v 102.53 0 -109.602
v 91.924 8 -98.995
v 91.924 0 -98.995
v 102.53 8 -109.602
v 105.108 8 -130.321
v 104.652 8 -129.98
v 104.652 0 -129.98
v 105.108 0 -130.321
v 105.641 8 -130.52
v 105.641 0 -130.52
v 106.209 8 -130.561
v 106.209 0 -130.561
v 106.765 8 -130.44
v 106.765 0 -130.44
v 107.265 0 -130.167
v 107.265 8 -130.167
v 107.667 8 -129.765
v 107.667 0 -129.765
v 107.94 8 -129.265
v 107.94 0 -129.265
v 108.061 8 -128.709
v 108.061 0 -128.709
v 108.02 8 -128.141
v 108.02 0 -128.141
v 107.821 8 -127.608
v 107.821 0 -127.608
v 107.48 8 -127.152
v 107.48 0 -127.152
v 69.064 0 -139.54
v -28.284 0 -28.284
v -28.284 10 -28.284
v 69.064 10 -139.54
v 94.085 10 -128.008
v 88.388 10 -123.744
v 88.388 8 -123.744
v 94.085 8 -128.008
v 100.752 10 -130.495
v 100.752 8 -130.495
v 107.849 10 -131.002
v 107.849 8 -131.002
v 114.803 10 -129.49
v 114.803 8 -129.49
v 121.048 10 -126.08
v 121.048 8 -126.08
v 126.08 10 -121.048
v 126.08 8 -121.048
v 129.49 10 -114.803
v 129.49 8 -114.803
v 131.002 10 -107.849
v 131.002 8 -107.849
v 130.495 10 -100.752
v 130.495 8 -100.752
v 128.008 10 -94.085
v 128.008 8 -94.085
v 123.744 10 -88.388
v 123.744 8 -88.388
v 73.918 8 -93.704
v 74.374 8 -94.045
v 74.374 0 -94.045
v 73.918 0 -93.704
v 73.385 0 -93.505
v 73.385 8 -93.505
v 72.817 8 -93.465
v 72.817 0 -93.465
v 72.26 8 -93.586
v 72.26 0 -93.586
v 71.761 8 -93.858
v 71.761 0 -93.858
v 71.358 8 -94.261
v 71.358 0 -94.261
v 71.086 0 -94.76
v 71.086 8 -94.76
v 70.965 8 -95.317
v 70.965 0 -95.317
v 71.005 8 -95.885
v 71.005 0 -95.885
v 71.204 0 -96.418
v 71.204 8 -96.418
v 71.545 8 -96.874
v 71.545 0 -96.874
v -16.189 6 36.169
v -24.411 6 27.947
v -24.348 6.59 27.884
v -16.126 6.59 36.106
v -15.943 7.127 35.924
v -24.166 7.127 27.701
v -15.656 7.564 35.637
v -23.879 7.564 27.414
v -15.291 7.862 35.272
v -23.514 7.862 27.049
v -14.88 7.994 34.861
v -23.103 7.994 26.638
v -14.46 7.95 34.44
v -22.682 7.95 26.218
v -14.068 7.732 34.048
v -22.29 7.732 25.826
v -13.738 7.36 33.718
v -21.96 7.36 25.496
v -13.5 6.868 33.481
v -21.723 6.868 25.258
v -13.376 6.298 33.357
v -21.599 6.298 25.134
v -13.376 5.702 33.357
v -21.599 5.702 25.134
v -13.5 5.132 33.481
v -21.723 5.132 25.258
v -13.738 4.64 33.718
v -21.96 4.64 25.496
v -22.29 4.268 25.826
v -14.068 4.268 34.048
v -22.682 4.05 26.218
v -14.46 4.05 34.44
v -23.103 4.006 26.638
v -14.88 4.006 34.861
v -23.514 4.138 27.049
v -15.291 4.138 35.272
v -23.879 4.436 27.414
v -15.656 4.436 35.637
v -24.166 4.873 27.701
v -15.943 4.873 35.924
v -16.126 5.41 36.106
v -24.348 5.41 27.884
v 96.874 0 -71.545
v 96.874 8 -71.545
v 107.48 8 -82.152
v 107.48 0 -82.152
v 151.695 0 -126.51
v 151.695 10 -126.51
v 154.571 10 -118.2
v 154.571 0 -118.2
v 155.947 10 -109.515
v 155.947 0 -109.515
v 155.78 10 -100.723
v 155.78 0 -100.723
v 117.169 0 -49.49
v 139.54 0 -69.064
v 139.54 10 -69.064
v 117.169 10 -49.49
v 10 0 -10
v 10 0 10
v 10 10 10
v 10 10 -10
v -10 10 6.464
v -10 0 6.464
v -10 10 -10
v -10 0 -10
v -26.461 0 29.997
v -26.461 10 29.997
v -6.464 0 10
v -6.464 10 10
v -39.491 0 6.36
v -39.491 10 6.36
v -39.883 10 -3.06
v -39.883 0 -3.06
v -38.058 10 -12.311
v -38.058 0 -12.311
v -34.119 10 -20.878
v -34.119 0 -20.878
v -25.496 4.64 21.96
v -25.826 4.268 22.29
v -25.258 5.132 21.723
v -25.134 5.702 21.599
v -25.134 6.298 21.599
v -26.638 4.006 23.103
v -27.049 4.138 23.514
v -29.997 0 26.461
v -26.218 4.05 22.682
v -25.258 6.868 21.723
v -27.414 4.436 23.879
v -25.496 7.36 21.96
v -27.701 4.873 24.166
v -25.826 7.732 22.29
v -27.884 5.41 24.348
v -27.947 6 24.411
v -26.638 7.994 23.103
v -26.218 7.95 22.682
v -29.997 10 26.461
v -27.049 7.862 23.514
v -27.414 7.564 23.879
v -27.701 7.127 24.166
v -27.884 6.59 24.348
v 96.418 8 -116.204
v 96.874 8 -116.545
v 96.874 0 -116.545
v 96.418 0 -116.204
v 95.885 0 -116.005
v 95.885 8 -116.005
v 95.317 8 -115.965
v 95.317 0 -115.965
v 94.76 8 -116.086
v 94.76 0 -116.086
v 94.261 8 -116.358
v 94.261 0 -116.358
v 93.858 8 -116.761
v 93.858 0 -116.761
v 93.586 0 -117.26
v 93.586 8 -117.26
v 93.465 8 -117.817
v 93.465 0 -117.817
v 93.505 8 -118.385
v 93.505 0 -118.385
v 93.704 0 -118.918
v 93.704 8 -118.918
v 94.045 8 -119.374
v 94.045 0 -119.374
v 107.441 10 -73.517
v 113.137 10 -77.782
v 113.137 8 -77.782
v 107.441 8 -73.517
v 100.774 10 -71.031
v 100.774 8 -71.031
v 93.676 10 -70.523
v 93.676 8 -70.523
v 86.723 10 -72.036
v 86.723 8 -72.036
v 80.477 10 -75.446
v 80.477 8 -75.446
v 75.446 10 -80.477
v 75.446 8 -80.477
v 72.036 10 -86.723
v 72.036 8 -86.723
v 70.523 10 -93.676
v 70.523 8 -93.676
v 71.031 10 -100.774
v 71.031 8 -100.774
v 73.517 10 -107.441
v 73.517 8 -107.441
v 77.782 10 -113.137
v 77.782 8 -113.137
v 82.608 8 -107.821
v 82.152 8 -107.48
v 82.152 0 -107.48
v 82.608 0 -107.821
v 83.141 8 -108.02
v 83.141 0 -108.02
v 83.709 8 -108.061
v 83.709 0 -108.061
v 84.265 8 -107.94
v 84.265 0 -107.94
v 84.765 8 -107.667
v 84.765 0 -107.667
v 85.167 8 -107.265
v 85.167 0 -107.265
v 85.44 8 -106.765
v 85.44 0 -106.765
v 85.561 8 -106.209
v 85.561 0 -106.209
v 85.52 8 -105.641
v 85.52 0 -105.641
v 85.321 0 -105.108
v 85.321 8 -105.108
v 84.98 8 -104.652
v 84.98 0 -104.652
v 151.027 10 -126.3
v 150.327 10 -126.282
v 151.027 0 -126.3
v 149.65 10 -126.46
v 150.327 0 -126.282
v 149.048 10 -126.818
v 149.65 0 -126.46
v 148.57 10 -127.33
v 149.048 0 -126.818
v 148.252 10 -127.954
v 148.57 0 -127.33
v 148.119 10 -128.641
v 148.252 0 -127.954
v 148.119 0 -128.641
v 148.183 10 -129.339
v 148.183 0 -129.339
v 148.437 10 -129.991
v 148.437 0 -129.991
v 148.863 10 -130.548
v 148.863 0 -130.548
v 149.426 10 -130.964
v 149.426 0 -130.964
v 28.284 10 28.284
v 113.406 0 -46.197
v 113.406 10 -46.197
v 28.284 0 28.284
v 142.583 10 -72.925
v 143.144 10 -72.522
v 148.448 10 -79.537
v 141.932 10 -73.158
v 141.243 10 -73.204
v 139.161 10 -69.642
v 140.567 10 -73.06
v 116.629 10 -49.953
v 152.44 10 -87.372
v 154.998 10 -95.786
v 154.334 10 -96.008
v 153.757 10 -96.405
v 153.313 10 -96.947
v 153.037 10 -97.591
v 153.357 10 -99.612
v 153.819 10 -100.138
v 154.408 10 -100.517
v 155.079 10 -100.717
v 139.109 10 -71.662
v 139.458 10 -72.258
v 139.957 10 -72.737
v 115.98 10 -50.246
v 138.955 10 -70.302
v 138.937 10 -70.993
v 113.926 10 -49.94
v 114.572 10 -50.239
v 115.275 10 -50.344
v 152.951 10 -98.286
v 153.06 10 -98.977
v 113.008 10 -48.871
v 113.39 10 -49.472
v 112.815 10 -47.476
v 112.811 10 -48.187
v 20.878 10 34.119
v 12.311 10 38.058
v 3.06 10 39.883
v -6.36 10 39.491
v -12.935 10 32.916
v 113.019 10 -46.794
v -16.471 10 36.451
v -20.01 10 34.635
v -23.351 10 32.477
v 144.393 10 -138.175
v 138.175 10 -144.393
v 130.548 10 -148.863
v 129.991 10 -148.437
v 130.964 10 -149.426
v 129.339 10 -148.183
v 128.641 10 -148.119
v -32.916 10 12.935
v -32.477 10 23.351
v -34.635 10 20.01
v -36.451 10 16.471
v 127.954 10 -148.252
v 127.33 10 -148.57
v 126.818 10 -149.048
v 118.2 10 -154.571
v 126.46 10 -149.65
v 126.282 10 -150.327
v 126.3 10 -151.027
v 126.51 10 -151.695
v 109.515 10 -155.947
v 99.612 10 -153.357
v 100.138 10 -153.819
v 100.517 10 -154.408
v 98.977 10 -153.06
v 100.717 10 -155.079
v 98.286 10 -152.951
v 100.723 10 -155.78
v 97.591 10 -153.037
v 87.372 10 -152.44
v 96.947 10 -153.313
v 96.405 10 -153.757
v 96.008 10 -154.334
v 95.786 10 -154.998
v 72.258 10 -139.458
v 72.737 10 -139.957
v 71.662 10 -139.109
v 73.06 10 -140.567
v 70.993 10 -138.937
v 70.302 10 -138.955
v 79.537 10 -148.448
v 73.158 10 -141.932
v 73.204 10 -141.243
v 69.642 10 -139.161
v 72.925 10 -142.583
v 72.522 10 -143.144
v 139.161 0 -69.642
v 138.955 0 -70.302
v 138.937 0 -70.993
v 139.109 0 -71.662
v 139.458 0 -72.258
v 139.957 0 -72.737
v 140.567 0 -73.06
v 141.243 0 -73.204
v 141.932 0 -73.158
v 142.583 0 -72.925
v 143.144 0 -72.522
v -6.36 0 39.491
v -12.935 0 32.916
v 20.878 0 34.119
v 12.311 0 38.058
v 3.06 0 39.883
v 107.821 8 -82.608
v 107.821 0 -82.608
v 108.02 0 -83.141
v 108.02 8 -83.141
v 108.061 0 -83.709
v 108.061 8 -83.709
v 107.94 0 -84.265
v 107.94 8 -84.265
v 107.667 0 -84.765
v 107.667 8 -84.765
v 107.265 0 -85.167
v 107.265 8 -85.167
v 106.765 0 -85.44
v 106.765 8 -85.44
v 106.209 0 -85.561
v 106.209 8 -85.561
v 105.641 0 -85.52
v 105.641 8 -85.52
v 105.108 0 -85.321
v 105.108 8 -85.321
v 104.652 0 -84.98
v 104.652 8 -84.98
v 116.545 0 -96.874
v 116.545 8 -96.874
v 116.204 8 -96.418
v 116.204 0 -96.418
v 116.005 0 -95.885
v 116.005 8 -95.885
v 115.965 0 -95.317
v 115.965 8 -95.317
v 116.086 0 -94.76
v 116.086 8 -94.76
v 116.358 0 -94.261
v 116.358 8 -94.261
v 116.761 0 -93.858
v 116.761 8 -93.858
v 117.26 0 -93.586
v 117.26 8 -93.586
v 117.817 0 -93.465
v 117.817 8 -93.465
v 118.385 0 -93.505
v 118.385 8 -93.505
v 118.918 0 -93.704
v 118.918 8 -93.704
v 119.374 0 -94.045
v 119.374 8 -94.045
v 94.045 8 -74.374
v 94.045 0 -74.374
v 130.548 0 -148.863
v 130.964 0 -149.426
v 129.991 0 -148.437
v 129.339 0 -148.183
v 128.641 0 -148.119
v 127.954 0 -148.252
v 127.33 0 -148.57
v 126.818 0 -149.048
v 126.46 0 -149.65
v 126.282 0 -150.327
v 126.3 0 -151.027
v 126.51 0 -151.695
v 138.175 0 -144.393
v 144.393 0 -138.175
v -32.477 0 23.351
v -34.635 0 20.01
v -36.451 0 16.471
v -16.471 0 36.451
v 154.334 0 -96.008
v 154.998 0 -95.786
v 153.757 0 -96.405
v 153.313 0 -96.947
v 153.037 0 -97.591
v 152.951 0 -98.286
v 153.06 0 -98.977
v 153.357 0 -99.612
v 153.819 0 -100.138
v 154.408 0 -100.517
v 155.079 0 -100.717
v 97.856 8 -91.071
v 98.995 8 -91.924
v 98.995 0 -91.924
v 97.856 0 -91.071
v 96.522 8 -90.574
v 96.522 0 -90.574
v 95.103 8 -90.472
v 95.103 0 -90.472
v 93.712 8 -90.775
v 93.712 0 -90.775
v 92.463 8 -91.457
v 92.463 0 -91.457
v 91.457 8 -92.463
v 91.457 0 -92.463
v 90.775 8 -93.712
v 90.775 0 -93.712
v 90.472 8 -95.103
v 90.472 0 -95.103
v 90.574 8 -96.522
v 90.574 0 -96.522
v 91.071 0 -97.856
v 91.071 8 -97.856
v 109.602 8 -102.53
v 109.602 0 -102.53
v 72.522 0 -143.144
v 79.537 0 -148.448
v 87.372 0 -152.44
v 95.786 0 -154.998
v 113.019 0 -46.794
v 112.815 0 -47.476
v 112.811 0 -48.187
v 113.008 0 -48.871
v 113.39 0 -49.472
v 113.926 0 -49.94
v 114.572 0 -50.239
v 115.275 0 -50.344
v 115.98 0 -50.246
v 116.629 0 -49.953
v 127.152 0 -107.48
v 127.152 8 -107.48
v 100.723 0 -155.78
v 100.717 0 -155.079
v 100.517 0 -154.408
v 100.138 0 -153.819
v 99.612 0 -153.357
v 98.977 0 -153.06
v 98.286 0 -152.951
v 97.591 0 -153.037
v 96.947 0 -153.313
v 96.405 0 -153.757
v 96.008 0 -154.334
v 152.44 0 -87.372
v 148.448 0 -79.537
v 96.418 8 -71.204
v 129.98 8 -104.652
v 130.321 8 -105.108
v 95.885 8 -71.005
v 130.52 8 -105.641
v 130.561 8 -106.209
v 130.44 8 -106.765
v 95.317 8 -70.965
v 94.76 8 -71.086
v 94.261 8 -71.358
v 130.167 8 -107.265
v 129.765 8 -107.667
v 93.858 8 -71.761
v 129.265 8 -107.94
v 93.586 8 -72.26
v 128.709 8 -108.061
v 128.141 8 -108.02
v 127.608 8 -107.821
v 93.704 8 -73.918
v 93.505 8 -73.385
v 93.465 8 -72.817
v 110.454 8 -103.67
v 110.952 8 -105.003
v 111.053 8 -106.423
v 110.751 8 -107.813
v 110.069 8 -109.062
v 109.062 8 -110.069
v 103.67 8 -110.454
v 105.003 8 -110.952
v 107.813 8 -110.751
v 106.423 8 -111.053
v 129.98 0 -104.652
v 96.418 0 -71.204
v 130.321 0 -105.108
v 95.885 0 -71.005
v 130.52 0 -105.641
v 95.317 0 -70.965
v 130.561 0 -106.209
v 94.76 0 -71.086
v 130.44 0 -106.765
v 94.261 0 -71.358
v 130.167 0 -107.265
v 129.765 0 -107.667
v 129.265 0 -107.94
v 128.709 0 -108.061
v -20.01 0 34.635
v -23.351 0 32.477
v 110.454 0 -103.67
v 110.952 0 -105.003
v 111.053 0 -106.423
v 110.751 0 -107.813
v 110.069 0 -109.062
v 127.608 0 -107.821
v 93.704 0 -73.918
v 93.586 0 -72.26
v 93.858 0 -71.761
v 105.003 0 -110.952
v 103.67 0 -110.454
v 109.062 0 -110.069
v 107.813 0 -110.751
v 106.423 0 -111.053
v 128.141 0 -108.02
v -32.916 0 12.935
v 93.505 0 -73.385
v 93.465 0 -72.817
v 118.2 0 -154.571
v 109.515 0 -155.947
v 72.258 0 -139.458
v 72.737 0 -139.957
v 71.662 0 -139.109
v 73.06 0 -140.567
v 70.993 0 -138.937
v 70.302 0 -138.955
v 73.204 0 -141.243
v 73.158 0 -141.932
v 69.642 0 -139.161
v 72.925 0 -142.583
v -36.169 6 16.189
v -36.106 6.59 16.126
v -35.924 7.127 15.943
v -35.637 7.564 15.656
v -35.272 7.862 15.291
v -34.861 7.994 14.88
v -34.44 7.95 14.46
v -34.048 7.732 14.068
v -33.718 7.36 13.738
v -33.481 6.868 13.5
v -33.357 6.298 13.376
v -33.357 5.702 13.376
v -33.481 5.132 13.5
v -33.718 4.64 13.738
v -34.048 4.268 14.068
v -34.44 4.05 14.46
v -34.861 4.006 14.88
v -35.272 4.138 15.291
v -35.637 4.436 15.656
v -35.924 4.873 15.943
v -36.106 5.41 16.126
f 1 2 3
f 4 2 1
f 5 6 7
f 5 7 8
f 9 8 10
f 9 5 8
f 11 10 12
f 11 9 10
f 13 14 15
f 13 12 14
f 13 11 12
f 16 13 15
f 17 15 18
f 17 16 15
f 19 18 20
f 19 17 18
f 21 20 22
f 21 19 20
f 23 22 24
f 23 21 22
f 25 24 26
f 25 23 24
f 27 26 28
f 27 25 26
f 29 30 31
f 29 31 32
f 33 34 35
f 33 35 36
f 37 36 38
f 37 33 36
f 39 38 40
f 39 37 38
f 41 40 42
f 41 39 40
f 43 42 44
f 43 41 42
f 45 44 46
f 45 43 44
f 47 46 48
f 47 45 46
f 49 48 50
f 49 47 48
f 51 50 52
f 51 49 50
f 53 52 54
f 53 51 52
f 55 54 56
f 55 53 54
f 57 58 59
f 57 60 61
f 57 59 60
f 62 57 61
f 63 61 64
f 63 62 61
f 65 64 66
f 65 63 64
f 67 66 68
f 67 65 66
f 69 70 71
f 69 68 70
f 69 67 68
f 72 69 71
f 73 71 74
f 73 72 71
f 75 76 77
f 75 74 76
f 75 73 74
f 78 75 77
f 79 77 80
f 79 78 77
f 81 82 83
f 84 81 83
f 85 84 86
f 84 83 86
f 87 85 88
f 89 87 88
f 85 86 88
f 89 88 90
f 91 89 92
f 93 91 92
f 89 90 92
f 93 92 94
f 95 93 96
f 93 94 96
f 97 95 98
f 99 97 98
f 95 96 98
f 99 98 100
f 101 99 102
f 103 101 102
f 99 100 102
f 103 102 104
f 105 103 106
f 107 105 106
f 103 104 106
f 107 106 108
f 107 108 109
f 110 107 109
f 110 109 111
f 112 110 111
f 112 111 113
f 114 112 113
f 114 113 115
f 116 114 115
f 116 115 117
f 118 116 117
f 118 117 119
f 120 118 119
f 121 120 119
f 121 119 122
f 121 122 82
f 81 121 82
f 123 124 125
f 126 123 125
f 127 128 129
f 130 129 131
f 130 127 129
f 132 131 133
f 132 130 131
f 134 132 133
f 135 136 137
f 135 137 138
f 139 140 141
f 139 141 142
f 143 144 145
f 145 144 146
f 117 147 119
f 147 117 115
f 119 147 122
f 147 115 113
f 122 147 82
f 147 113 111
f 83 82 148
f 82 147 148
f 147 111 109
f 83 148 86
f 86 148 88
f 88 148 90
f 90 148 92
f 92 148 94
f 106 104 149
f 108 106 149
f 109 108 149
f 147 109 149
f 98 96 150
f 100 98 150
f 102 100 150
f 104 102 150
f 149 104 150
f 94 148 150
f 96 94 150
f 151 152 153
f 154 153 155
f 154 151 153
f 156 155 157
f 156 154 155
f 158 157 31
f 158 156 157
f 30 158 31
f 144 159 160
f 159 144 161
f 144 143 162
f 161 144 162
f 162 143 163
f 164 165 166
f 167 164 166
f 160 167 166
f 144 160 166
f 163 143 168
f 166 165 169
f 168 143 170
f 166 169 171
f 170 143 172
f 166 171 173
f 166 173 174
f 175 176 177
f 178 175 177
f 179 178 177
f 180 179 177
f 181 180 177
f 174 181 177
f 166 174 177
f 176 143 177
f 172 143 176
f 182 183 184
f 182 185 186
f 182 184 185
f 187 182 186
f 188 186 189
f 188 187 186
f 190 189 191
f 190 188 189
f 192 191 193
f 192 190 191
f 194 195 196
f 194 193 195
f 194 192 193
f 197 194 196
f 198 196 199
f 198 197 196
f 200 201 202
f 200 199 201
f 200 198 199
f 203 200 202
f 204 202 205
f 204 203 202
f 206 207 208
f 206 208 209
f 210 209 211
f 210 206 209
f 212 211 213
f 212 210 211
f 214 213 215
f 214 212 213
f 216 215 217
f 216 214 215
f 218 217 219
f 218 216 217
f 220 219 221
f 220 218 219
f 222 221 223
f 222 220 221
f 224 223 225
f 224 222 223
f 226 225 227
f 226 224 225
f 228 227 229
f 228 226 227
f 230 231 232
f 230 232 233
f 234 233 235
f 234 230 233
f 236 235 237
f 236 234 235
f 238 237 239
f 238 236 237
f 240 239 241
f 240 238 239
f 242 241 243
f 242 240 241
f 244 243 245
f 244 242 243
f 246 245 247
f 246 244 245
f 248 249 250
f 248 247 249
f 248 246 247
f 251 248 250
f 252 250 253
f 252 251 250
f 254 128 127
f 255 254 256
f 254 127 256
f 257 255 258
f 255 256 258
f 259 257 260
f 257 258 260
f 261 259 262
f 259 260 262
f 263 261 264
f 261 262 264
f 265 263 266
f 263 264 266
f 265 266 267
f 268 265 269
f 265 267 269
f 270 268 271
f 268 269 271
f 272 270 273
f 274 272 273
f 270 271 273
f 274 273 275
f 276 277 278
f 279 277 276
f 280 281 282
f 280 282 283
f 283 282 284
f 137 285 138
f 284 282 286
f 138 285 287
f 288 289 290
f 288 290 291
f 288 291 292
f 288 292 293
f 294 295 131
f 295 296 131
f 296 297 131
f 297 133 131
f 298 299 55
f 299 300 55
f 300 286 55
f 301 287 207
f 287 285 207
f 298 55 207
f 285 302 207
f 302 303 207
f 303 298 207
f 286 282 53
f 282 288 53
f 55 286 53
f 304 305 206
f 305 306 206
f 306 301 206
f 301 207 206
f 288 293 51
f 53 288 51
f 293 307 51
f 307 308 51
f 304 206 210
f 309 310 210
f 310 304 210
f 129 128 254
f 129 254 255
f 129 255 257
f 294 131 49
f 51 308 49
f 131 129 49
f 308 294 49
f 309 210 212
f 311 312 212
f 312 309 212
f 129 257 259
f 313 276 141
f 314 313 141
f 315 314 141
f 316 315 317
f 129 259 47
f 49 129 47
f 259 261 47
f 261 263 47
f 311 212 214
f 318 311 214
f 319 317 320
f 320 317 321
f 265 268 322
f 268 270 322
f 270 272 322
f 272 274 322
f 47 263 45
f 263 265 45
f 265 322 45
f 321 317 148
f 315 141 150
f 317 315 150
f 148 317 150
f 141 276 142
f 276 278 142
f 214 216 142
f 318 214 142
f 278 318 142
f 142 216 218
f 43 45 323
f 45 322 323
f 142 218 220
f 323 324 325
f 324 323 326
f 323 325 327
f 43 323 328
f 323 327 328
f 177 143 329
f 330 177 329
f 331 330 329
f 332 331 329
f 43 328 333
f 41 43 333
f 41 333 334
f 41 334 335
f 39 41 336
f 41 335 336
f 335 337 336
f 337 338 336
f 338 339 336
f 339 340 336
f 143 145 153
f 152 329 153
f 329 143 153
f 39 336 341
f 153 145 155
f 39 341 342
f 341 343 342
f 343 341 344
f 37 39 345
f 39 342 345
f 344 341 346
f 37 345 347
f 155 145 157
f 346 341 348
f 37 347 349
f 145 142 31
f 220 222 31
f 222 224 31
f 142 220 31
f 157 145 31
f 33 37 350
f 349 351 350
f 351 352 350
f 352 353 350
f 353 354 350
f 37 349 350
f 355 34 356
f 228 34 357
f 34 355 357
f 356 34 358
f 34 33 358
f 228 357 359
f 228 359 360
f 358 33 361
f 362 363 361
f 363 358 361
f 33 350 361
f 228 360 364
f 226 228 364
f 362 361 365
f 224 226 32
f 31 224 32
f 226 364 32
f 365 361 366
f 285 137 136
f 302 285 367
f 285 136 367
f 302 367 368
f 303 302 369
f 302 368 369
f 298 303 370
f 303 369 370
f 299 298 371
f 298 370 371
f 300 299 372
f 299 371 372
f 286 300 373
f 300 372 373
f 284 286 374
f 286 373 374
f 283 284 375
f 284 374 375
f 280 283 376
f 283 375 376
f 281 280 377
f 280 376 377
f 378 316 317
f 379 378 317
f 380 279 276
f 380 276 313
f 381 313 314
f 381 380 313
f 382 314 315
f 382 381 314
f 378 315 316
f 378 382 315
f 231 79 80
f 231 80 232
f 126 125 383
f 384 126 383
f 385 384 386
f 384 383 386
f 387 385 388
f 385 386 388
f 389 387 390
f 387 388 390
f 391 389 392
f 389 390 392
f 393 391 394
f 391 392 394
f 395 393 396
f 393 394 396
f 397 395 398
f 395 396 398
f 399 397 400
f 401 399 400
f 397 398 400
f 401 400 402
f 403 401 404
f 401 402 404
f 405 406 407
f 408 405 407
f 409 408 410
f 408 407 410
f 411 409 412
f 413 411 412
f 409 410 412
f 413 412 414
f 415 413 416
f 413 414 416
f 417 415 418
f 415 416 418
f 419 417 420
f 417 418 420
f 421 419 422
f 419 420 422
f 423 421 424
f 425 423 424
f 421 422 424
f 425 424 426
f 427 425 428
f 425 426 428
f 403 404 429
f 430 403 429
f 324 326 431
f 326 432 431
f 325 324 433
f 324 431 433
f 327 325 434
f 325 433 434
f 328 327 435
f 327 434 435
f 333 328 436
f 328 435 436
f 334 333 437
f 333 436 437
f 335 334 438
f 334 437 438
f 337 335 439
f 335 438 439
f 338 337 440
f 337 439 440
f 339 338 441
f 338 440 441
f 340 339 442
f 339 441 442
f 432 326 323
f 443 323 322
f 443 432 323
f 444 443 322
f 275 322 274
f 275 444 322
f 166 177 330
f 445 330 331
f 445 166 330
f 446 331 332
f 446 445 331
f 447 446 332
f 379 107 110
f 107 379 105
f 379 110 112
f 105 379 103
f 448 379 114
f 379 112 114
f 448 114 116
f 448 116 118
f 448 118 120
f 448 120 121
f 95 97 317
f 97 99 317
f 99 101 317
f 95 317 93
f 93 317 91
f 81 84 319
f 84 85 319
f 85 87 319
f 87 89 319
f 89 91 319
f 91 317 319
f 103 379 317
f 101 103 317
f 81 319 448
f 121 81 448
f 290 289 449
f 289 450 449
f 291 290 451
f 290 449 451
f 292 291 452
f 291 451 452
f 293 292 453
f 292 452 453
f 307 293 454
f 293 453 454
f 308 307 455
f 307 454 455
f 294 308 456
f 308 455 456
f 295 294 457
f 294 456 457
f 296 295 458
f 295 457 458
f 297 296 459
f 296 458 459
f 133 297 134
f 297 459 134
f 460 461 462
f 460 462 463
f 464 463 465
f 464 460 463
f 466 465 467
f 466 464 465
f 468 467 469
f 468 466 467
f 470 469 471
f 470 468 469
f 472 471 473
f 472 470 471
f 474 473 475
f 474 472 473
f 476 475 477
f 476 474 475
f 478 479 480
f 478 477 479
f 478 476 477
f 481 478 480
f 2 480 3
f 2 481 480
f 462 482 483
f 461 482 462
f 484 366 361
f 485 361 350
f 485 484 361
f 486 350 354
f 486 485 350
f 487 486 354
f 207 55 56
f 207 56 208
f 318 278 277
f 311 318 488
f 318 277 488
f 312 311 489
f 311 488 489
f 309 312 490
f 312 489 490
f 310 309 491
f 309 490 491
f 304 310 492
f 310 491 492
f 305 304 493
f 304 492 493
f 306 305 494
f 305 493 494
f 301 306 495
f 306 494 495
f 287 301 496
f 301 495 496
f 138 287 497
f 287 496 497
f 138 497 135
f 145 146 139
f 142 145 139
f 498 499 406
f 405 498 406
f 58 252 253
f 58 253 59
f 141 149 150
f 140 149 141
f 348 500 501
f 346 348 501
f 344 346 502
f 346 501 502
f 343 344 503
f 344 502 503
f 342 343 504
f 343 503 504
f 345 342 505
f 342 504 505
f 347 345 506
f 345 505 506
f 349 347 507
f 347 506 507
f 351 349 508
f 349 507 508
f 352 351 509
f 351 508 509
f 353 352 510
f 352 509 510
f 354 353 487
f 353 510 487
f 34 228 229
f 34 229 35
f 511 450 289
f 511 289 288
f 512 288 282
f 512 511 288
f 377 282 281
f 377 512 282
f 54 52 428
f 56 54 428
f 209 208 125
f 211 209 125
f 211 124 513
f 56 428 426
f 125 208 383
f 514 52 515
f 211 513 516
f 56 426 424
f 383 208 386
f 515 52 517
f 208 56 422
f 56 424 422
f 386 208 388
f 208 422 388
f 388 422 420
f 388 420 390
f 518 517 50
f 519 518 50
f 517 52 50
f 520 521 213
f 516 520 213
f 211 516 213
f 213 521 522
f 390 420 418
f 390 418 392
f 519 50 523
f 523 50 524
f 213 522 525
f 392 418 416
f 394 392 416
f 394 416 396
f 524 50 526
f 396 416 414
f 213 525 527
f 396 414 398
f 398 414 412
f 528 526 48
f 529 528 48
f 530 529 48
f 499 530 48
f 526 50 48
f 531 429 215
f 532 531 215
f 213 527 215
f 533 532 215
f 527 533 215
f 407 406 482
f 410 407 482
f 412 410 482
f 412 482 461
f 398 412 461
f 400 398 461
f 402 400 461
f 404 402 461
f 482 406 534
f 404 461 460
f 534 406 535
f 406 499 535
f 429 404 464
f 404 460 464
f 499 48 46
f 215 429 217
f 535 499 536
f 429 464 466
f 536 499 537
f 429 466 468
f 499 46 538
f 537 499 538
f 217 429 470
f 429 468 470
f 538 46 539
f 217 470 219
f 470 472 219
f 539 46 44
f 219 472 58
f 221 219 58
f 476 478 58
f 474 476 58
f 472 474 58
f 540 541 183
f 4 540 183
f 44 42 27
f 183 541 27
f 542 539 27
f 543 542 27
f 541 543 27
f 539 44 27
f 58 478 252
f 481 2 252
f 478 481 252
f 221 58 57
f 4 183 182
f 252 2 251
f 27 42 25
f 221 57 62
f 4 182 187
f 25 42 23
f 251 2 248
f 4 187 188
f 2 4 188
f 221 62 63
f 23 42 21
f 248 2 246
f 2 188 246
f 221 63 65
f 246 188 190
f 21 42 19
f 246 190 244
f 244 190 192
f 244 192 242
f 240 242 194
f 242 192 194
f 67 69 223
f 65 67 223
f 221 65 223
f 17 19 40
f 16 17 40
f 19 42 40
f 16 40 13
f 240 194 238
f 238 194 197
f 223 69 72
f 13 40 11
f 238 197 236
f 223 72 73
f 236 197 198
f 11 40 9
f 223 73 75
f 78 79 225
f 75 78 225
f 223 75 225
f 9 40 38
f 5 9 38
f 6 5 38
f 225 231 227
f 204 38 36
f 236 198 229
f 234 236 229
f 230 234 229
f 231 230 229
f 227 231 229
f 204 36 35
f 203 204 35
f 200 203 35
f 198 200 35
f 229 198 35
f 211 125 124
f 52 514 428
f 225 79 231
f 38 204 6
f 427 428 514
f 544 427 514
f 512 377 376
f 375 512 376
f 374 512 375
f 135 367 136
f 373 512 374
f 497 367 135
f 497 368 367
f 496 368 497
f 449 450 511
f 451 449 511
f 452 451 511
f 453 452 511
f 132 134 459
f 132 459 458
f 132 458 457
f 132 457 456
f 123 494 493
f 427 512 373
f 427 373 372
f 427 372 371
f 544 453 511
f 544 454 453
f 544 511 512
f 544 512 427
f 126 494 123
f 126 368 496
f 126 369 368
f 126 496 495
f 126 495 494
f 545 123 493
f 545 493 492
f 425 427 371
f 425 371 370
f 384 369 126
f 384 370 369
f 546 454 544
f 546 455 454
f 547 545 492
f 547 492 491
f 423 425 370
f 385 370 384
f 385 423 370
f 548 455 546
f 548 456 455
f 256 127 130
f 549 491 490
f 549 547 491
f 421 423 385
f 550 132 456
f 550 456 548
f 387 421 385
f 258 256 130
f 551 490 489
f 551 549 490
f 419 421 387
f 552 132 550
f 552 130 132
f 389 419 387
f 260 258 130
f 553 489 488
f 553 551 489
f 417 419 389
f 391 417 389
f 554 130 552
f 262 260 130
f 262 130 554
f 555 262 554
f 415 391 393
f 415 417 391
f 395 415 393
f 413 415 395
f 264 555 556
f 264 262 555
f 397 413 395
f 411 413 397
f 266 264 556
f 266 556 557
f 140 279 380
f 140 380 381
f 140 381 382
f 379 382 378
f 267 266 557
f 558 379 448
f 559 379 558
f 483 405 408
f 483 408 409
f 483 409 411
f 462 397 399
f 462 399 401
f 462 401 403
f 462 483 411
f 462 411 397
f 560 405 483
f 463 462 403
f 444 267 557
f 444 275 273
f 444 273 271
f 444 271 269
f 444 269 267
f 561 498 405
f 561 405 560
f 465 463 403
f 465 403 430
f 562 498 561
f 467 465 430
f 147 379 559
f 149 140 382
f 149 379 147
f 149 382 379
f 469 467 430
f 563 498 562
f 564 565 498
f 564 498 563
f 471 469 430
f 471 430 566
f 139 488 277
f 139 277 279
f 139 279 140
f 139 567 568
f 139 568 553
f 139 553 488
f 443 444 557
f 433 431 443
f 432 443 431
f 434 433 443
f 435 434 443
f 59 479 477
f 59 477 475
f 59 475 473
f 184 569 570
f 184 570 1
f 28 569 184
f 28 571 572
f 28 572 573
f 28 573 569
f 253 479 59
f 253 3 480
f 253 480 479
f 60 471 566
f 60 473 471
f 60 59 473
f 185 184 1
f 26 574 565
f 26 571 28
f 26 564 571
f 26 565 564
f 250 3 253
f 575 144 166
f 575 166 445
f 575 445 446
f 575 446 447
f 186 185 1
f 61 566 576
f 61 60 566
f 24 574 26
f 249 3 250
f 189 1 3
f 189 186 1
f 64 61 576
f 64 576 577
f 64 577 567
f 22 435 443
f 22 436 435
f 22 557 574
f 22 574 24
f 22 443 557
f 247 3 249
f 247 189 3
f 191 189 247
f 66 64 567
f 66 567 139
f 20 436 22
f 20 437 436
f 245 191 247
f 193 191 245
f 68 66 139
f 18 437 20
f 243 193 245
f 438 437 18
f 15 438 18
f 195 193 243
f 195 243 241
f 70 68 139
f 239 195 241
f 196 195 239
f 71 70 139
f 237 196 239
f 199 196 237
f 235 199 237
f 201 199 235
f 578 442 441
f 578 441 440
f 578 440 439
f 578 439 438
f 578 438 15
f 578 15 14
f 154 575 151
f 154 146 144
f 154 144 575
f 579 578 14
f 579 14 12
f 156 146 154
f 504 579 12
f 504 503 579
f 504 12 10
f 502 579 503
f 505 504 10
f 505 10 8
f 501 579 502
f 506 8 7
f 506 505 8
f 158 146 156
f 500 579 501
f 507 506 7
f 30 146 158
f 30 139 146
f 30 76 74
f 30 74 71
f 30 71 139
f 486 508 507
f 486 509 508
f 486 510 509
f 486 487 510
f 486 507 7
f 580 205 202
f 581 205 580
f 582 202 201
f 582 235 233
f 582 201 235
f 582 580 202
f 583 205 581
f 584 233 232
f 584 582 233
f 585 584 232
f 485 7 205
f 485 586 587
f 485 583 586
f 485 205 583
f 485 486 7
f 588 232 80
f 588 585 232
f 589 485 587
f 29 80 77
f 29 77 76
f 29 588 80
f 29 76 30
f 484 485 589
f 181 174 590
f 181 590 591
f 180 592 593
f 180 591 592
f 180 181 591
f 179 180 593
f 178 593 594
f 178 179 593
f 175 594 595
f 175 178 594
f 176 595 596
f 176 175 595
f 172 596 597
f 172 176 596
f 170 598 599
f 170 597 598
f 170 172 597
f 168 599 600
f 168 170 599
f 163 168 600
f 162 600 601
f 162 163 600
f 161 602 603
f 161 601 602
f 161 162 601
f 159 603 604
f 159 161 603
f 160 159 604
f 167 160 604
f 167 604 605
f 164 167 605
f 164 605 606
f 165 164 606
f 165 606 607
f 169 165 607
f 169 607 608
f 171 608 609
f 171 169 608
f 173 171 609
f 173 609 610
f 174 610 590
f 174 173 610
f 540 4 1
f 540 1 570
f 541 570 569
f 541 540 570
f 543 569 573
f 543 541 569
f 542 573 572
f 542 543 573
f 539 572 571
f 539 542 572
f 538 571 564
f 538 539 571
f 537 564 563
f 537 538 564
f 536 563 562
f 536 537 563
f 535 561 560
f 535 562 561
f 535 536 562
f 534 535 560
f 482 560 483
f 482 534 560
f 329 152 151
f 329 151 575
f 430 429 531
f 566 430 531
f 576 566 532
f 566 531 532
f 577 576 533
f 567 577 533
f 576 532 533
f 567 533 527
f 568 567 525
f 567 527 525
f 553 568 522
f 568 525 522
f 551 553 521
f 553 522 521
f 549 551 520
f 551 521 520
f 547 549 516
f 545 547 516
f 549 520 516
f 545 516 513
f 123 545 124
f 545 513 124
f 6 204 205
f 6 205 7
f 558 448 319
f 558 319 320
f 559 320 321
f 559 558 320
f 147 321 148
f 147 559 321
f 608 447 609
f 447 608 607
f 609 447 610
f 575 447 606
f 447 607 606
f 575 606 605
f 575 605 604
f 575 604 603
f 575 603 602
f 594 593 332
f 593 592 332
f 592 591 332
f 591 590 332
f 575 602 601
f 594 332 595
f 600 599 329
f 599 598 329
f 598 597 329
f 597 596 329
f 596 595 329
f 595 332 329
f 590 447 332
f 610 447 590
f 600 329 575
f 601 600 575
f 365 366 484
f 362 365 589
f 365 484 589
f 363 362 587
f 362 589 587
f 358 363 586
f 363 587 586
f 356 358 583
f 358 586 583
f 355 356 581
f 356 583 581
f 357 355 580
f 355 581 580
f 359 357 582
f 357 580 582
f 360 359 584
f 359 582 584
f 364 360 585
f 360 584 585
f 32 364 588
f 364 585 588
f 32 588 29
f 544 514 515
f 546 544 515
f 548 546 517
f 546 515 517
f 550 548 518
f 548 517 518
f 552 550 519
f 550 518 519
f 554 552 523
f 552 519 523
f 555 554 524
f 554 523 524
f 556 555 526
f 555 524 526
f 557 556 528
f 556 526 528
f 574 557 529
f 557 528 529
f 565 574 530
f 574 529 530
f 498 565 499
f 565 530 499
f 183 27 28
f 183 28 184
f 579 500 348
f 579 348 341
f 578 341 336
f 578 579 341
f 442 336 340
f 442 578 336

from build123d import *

# Parameters (mm, degrees)
ESQUISSE1_W                  = 20
ESQUISSE1_H                  = 20
BOSS_EXTRU_1_DEPTH           = 10
ENL_V_MAT_EXTRU_1_DEPTH      = 11
ESQUISSE4_R                  = 2
ENL_V_MAT_EXTRU_2_DEPTH      = 142.139610307
ENL_V_MAT_EXTRU_2_DEPTH_BACK = 137.139610307
ENL_V_MAT_EXTRU_3_DEPTH      = 11.0000001
ENL_V_MAT_EXTRU_4_DEPTH      = 11
ENL_V_MAT_EXTRU_5_DEPTH      = 2
ESQUISSE9_R                  = 2.5
ENL_V_MAT_EXTRU_6_DEPTH      = 11


with BuildPart() as part:
    # Esquisse1 → Boss.-Extru.1 (new body)
    with BuildSketch(Plane(origin=(0, 0, 0), x_dir=(1, 0, 0), z_dir=(0, 1, 0))):
        with BuildLine():
            Line((-28.284271247, 28.284271247), (70.710678119, 141.421356237))
            ThreePointArc((70.710678119, 141.421356237), (141.421356237, 141.421356237), (141.421356237, 70.710678119))
            Line((141.421356237, 70.710678119), (28.284271247, -28.284271247))
            ThreePointArc((28.284271247, -28.284271247), (-28.284271247, -28.284271247), (-28.284271247, 28.284271247))
        make_face()
        Rectangle(ESQUISSE1_W, ESQUISSE1_H, mode=Mode.SUBTRACT)
    extrude(amount=BOSS_EXTRU_1_DEPTH)

    # Esquisse3 → Enlèv. mat.-Extru.1 (cut, through all)
    with BuildSketch(Plane(origin=(0, 10, 0), x_dir=(1, 0, 0), z_dir=(0, 1, 0))):
        Polygon((-8.232233047, -11.767766953), (-27.234385984, -30.76991989), (-30.76991989, -27.234385984), (-11.767766953, -8.232233047), (-9.726873799, -6.191339893), (-6.191339893, -9.726873799), align=None)
    extrude(amount=-ENL_V_MAT_EXTRU_1_DEPTH, mode=Mode.SUBTRACT)

    # Esquisse4 → Enlèv. mat.-Extru.2 (cut, two sides)
    with BuildSketch(Plane(origin=(1.767766953, 0, 1.767766953), x_dir=(-0.707106781, 0, 0.707106781), z_dir=(-0.707106781, 0, -0.707106781))) as enl_v_mat_extru_2_sk:
        with Locations((35.022819071, 6)):
            Circle(ESQUISSE4_R)
    extrude(amount=ENL_V_MAT_EXTRU_2_DEPTH, mode=Mode.SUBTRACT)
    extrude(enl_v_mat_extru_2_sk.sketch, amount=-ENL_V_MAT_EXTRU_2_DEPTH_BACK, mode=Mode.SUBTRACT)

    # Esquisse5 → Enlèv. mat.-Extru.3 (cut, through all)
    with BuildSketch(Plane(origin=(0, 10, 0), x_dir=(1, 0, 0), z_dir=(0, 1, 0))):
        Polygon((-34.683660608, -14.703220533), (-36.451427561, -16.470987486), (-40.908486709, -7.777625617), (-39.491104164, -6.360243072), (-32.915893655, -12.93545358), align=None)
        Polygon((-7.777625617, -40.908486709), (-6.360243072, -39.491104164), (-12.93545358, -32.915893655), (-14.703220533, -34.683660608), (-16.470987486, -36.451427561), align=None)
    extrude(amount=-ENL_V_MAT_EXTRU_3_DEPTH, mode=Mode.SUBTRACT)

    # Esquisse7 → Enlèv. mat.-Extru.4 (cut, through all)
    with BuildSketch(Plane(origin=(0, 10, 0), x_dir=(1, 0, 0), z_dir=(0, 1, 0))):
        with BuildLine():
            Line((91.923881554, 98.994949366), (102.530483272, 109.601551084))
            ThreePointArc((102.530483272, 109.601551084), (109.601551084, 109.601551084), (109.601551084, 102.530483272))
            Line((109.601551084, 102.530483272), (98.994949366, 91.923881554))
            ThreePointArc((98.994949366, 91.923881554), (91.923881554, 91.923881554), (91.923881554, 98.994949366))
        make_face()
        with BuildLine():
            Line((94.045201898, 119.373629023), (104.651803616, 129.98023074))
            ThreePointArc((104.651803616, 129.98023074), (107.48023074, 129.98023074), (107.48023074, 127.151803616))
            Line((107.48023074, 127.151803616), (96.873629023, 116.545201898))
            ThreePointArc((96.873629023, 116.545201898), (94.045201898, 116.545201898), (94.045201898, 119.373629023))
        make_face()
        with BuildLine():
            Line((71.545201898, 96.873629023), (82.151803616, 107.48023074))
            ThreePointArc((82.151803616, 107.48023074), (84.98023074, 107.48023074), (84.98023074, 104.651803616))
            Line((84.98023074, 104.651803616), (74.373629023, 94.045201898))
            ThreePointArc((74.373629023, 94.045201898), (71.545201898, 94.045201898), (71.545201898, 96.873629023))
        make_face()
        with BuildLine():
            Line((119.373629023, 94.045201898), (129.98023074, 104.651803616))
            ThreePointArc((129.98023074, 104.651803616), (129.98023074, 107.48023074), (127.151803616, 107.48023074))
            Line((127.151803616, 107.48023074), (116.545201898, 96.873629023))
            ThreePointArc((116.545201898, 96.873629023), (116.545201898, 94.045201898), (119.373629023, 94.045201898))
        make_face()
        with BuildLine():
            Line((96.873629023, 71.545201898), (107.48023074, 82.151803616))
            ThreePointArc((107.48023074, 82.151803616), (107.48023074, 84.98023074), (104.651803616, 84.98023074))
            Line((104.651803616, 84.98023074), (94.045201898, 74.373629023))
            ThreePointArc((94.045201898, 74.373629023), (94.045201898, 71.545201898), (96.873629023, 71.545201898))
        make_face()
    extrude(amount=-ENL_V_MAT_EXTRU_4_DEPTH, mode=Mode.SUBTRACT)

    # Esquisse8 → Enlèv. mat.-Extru.5 (cut)
    with BuildSketch(Plane(origin=(0, 10, 0), x_dir=(1, 0, 0), z_dir=(0, 1, 0))):
        with BuildLine():
            Line((123.743686708, 88.388347648), (113.13708499, 77.781745931))
            ThreePointArc((113.13708499, 77.781745931), (77.781745931, 77.781745931), (77.781745931, 113.13708499))
            Line((77.781745931, 113.13708499), (88.388347648, 123.743686708))
            ThreePointArc((88.388347648, 123.743686708), (123.743686708, 123.743686708), (123.743686708, 88.388347648))
        make_face()
    extrude(amount=-ENL_V_MAT_EXTRU_5_DEPTH, mode=Mode.SUBTRACT)

    # Esquisse9 → Enlèv. mat.-Extru.6 (cut, through all)
    with BuildSketch(Plane(origin=(0, 0, 0), x_dir=(-1, 0, 0), z_dir=(0, -1, 0))):
        with Locations((-70.710678119, 141.421356237)):
            Circle(ESQUISSE9_R)
        with Locations((-98.244293926, 155.450434208)):
            Circle(ESQUISSE9_R)
        with Locations((-128.765542165, 150.616343387)):
            Circle(ESQUISSE9_R)
        with Locations((-150.616343387, 128.765542165)):
            Circle(ESQUISSE9_R)
        with Locations((-155.450434208, 98.244293926)):
            Circle(ESQUISSE9_R)
        with Locations((-141.421356237, 70.710678119)):
            Circle(ESQUISSE9_R)
        with Locations((-115.287543419, 47.843591903)):
            Circle(ESQUISSE9_R)
    extrude(amount=-ENL_V_MAT_EXTRU_6_DEPTH, mode=Mode.SUBTRACT)


solid = part.part
